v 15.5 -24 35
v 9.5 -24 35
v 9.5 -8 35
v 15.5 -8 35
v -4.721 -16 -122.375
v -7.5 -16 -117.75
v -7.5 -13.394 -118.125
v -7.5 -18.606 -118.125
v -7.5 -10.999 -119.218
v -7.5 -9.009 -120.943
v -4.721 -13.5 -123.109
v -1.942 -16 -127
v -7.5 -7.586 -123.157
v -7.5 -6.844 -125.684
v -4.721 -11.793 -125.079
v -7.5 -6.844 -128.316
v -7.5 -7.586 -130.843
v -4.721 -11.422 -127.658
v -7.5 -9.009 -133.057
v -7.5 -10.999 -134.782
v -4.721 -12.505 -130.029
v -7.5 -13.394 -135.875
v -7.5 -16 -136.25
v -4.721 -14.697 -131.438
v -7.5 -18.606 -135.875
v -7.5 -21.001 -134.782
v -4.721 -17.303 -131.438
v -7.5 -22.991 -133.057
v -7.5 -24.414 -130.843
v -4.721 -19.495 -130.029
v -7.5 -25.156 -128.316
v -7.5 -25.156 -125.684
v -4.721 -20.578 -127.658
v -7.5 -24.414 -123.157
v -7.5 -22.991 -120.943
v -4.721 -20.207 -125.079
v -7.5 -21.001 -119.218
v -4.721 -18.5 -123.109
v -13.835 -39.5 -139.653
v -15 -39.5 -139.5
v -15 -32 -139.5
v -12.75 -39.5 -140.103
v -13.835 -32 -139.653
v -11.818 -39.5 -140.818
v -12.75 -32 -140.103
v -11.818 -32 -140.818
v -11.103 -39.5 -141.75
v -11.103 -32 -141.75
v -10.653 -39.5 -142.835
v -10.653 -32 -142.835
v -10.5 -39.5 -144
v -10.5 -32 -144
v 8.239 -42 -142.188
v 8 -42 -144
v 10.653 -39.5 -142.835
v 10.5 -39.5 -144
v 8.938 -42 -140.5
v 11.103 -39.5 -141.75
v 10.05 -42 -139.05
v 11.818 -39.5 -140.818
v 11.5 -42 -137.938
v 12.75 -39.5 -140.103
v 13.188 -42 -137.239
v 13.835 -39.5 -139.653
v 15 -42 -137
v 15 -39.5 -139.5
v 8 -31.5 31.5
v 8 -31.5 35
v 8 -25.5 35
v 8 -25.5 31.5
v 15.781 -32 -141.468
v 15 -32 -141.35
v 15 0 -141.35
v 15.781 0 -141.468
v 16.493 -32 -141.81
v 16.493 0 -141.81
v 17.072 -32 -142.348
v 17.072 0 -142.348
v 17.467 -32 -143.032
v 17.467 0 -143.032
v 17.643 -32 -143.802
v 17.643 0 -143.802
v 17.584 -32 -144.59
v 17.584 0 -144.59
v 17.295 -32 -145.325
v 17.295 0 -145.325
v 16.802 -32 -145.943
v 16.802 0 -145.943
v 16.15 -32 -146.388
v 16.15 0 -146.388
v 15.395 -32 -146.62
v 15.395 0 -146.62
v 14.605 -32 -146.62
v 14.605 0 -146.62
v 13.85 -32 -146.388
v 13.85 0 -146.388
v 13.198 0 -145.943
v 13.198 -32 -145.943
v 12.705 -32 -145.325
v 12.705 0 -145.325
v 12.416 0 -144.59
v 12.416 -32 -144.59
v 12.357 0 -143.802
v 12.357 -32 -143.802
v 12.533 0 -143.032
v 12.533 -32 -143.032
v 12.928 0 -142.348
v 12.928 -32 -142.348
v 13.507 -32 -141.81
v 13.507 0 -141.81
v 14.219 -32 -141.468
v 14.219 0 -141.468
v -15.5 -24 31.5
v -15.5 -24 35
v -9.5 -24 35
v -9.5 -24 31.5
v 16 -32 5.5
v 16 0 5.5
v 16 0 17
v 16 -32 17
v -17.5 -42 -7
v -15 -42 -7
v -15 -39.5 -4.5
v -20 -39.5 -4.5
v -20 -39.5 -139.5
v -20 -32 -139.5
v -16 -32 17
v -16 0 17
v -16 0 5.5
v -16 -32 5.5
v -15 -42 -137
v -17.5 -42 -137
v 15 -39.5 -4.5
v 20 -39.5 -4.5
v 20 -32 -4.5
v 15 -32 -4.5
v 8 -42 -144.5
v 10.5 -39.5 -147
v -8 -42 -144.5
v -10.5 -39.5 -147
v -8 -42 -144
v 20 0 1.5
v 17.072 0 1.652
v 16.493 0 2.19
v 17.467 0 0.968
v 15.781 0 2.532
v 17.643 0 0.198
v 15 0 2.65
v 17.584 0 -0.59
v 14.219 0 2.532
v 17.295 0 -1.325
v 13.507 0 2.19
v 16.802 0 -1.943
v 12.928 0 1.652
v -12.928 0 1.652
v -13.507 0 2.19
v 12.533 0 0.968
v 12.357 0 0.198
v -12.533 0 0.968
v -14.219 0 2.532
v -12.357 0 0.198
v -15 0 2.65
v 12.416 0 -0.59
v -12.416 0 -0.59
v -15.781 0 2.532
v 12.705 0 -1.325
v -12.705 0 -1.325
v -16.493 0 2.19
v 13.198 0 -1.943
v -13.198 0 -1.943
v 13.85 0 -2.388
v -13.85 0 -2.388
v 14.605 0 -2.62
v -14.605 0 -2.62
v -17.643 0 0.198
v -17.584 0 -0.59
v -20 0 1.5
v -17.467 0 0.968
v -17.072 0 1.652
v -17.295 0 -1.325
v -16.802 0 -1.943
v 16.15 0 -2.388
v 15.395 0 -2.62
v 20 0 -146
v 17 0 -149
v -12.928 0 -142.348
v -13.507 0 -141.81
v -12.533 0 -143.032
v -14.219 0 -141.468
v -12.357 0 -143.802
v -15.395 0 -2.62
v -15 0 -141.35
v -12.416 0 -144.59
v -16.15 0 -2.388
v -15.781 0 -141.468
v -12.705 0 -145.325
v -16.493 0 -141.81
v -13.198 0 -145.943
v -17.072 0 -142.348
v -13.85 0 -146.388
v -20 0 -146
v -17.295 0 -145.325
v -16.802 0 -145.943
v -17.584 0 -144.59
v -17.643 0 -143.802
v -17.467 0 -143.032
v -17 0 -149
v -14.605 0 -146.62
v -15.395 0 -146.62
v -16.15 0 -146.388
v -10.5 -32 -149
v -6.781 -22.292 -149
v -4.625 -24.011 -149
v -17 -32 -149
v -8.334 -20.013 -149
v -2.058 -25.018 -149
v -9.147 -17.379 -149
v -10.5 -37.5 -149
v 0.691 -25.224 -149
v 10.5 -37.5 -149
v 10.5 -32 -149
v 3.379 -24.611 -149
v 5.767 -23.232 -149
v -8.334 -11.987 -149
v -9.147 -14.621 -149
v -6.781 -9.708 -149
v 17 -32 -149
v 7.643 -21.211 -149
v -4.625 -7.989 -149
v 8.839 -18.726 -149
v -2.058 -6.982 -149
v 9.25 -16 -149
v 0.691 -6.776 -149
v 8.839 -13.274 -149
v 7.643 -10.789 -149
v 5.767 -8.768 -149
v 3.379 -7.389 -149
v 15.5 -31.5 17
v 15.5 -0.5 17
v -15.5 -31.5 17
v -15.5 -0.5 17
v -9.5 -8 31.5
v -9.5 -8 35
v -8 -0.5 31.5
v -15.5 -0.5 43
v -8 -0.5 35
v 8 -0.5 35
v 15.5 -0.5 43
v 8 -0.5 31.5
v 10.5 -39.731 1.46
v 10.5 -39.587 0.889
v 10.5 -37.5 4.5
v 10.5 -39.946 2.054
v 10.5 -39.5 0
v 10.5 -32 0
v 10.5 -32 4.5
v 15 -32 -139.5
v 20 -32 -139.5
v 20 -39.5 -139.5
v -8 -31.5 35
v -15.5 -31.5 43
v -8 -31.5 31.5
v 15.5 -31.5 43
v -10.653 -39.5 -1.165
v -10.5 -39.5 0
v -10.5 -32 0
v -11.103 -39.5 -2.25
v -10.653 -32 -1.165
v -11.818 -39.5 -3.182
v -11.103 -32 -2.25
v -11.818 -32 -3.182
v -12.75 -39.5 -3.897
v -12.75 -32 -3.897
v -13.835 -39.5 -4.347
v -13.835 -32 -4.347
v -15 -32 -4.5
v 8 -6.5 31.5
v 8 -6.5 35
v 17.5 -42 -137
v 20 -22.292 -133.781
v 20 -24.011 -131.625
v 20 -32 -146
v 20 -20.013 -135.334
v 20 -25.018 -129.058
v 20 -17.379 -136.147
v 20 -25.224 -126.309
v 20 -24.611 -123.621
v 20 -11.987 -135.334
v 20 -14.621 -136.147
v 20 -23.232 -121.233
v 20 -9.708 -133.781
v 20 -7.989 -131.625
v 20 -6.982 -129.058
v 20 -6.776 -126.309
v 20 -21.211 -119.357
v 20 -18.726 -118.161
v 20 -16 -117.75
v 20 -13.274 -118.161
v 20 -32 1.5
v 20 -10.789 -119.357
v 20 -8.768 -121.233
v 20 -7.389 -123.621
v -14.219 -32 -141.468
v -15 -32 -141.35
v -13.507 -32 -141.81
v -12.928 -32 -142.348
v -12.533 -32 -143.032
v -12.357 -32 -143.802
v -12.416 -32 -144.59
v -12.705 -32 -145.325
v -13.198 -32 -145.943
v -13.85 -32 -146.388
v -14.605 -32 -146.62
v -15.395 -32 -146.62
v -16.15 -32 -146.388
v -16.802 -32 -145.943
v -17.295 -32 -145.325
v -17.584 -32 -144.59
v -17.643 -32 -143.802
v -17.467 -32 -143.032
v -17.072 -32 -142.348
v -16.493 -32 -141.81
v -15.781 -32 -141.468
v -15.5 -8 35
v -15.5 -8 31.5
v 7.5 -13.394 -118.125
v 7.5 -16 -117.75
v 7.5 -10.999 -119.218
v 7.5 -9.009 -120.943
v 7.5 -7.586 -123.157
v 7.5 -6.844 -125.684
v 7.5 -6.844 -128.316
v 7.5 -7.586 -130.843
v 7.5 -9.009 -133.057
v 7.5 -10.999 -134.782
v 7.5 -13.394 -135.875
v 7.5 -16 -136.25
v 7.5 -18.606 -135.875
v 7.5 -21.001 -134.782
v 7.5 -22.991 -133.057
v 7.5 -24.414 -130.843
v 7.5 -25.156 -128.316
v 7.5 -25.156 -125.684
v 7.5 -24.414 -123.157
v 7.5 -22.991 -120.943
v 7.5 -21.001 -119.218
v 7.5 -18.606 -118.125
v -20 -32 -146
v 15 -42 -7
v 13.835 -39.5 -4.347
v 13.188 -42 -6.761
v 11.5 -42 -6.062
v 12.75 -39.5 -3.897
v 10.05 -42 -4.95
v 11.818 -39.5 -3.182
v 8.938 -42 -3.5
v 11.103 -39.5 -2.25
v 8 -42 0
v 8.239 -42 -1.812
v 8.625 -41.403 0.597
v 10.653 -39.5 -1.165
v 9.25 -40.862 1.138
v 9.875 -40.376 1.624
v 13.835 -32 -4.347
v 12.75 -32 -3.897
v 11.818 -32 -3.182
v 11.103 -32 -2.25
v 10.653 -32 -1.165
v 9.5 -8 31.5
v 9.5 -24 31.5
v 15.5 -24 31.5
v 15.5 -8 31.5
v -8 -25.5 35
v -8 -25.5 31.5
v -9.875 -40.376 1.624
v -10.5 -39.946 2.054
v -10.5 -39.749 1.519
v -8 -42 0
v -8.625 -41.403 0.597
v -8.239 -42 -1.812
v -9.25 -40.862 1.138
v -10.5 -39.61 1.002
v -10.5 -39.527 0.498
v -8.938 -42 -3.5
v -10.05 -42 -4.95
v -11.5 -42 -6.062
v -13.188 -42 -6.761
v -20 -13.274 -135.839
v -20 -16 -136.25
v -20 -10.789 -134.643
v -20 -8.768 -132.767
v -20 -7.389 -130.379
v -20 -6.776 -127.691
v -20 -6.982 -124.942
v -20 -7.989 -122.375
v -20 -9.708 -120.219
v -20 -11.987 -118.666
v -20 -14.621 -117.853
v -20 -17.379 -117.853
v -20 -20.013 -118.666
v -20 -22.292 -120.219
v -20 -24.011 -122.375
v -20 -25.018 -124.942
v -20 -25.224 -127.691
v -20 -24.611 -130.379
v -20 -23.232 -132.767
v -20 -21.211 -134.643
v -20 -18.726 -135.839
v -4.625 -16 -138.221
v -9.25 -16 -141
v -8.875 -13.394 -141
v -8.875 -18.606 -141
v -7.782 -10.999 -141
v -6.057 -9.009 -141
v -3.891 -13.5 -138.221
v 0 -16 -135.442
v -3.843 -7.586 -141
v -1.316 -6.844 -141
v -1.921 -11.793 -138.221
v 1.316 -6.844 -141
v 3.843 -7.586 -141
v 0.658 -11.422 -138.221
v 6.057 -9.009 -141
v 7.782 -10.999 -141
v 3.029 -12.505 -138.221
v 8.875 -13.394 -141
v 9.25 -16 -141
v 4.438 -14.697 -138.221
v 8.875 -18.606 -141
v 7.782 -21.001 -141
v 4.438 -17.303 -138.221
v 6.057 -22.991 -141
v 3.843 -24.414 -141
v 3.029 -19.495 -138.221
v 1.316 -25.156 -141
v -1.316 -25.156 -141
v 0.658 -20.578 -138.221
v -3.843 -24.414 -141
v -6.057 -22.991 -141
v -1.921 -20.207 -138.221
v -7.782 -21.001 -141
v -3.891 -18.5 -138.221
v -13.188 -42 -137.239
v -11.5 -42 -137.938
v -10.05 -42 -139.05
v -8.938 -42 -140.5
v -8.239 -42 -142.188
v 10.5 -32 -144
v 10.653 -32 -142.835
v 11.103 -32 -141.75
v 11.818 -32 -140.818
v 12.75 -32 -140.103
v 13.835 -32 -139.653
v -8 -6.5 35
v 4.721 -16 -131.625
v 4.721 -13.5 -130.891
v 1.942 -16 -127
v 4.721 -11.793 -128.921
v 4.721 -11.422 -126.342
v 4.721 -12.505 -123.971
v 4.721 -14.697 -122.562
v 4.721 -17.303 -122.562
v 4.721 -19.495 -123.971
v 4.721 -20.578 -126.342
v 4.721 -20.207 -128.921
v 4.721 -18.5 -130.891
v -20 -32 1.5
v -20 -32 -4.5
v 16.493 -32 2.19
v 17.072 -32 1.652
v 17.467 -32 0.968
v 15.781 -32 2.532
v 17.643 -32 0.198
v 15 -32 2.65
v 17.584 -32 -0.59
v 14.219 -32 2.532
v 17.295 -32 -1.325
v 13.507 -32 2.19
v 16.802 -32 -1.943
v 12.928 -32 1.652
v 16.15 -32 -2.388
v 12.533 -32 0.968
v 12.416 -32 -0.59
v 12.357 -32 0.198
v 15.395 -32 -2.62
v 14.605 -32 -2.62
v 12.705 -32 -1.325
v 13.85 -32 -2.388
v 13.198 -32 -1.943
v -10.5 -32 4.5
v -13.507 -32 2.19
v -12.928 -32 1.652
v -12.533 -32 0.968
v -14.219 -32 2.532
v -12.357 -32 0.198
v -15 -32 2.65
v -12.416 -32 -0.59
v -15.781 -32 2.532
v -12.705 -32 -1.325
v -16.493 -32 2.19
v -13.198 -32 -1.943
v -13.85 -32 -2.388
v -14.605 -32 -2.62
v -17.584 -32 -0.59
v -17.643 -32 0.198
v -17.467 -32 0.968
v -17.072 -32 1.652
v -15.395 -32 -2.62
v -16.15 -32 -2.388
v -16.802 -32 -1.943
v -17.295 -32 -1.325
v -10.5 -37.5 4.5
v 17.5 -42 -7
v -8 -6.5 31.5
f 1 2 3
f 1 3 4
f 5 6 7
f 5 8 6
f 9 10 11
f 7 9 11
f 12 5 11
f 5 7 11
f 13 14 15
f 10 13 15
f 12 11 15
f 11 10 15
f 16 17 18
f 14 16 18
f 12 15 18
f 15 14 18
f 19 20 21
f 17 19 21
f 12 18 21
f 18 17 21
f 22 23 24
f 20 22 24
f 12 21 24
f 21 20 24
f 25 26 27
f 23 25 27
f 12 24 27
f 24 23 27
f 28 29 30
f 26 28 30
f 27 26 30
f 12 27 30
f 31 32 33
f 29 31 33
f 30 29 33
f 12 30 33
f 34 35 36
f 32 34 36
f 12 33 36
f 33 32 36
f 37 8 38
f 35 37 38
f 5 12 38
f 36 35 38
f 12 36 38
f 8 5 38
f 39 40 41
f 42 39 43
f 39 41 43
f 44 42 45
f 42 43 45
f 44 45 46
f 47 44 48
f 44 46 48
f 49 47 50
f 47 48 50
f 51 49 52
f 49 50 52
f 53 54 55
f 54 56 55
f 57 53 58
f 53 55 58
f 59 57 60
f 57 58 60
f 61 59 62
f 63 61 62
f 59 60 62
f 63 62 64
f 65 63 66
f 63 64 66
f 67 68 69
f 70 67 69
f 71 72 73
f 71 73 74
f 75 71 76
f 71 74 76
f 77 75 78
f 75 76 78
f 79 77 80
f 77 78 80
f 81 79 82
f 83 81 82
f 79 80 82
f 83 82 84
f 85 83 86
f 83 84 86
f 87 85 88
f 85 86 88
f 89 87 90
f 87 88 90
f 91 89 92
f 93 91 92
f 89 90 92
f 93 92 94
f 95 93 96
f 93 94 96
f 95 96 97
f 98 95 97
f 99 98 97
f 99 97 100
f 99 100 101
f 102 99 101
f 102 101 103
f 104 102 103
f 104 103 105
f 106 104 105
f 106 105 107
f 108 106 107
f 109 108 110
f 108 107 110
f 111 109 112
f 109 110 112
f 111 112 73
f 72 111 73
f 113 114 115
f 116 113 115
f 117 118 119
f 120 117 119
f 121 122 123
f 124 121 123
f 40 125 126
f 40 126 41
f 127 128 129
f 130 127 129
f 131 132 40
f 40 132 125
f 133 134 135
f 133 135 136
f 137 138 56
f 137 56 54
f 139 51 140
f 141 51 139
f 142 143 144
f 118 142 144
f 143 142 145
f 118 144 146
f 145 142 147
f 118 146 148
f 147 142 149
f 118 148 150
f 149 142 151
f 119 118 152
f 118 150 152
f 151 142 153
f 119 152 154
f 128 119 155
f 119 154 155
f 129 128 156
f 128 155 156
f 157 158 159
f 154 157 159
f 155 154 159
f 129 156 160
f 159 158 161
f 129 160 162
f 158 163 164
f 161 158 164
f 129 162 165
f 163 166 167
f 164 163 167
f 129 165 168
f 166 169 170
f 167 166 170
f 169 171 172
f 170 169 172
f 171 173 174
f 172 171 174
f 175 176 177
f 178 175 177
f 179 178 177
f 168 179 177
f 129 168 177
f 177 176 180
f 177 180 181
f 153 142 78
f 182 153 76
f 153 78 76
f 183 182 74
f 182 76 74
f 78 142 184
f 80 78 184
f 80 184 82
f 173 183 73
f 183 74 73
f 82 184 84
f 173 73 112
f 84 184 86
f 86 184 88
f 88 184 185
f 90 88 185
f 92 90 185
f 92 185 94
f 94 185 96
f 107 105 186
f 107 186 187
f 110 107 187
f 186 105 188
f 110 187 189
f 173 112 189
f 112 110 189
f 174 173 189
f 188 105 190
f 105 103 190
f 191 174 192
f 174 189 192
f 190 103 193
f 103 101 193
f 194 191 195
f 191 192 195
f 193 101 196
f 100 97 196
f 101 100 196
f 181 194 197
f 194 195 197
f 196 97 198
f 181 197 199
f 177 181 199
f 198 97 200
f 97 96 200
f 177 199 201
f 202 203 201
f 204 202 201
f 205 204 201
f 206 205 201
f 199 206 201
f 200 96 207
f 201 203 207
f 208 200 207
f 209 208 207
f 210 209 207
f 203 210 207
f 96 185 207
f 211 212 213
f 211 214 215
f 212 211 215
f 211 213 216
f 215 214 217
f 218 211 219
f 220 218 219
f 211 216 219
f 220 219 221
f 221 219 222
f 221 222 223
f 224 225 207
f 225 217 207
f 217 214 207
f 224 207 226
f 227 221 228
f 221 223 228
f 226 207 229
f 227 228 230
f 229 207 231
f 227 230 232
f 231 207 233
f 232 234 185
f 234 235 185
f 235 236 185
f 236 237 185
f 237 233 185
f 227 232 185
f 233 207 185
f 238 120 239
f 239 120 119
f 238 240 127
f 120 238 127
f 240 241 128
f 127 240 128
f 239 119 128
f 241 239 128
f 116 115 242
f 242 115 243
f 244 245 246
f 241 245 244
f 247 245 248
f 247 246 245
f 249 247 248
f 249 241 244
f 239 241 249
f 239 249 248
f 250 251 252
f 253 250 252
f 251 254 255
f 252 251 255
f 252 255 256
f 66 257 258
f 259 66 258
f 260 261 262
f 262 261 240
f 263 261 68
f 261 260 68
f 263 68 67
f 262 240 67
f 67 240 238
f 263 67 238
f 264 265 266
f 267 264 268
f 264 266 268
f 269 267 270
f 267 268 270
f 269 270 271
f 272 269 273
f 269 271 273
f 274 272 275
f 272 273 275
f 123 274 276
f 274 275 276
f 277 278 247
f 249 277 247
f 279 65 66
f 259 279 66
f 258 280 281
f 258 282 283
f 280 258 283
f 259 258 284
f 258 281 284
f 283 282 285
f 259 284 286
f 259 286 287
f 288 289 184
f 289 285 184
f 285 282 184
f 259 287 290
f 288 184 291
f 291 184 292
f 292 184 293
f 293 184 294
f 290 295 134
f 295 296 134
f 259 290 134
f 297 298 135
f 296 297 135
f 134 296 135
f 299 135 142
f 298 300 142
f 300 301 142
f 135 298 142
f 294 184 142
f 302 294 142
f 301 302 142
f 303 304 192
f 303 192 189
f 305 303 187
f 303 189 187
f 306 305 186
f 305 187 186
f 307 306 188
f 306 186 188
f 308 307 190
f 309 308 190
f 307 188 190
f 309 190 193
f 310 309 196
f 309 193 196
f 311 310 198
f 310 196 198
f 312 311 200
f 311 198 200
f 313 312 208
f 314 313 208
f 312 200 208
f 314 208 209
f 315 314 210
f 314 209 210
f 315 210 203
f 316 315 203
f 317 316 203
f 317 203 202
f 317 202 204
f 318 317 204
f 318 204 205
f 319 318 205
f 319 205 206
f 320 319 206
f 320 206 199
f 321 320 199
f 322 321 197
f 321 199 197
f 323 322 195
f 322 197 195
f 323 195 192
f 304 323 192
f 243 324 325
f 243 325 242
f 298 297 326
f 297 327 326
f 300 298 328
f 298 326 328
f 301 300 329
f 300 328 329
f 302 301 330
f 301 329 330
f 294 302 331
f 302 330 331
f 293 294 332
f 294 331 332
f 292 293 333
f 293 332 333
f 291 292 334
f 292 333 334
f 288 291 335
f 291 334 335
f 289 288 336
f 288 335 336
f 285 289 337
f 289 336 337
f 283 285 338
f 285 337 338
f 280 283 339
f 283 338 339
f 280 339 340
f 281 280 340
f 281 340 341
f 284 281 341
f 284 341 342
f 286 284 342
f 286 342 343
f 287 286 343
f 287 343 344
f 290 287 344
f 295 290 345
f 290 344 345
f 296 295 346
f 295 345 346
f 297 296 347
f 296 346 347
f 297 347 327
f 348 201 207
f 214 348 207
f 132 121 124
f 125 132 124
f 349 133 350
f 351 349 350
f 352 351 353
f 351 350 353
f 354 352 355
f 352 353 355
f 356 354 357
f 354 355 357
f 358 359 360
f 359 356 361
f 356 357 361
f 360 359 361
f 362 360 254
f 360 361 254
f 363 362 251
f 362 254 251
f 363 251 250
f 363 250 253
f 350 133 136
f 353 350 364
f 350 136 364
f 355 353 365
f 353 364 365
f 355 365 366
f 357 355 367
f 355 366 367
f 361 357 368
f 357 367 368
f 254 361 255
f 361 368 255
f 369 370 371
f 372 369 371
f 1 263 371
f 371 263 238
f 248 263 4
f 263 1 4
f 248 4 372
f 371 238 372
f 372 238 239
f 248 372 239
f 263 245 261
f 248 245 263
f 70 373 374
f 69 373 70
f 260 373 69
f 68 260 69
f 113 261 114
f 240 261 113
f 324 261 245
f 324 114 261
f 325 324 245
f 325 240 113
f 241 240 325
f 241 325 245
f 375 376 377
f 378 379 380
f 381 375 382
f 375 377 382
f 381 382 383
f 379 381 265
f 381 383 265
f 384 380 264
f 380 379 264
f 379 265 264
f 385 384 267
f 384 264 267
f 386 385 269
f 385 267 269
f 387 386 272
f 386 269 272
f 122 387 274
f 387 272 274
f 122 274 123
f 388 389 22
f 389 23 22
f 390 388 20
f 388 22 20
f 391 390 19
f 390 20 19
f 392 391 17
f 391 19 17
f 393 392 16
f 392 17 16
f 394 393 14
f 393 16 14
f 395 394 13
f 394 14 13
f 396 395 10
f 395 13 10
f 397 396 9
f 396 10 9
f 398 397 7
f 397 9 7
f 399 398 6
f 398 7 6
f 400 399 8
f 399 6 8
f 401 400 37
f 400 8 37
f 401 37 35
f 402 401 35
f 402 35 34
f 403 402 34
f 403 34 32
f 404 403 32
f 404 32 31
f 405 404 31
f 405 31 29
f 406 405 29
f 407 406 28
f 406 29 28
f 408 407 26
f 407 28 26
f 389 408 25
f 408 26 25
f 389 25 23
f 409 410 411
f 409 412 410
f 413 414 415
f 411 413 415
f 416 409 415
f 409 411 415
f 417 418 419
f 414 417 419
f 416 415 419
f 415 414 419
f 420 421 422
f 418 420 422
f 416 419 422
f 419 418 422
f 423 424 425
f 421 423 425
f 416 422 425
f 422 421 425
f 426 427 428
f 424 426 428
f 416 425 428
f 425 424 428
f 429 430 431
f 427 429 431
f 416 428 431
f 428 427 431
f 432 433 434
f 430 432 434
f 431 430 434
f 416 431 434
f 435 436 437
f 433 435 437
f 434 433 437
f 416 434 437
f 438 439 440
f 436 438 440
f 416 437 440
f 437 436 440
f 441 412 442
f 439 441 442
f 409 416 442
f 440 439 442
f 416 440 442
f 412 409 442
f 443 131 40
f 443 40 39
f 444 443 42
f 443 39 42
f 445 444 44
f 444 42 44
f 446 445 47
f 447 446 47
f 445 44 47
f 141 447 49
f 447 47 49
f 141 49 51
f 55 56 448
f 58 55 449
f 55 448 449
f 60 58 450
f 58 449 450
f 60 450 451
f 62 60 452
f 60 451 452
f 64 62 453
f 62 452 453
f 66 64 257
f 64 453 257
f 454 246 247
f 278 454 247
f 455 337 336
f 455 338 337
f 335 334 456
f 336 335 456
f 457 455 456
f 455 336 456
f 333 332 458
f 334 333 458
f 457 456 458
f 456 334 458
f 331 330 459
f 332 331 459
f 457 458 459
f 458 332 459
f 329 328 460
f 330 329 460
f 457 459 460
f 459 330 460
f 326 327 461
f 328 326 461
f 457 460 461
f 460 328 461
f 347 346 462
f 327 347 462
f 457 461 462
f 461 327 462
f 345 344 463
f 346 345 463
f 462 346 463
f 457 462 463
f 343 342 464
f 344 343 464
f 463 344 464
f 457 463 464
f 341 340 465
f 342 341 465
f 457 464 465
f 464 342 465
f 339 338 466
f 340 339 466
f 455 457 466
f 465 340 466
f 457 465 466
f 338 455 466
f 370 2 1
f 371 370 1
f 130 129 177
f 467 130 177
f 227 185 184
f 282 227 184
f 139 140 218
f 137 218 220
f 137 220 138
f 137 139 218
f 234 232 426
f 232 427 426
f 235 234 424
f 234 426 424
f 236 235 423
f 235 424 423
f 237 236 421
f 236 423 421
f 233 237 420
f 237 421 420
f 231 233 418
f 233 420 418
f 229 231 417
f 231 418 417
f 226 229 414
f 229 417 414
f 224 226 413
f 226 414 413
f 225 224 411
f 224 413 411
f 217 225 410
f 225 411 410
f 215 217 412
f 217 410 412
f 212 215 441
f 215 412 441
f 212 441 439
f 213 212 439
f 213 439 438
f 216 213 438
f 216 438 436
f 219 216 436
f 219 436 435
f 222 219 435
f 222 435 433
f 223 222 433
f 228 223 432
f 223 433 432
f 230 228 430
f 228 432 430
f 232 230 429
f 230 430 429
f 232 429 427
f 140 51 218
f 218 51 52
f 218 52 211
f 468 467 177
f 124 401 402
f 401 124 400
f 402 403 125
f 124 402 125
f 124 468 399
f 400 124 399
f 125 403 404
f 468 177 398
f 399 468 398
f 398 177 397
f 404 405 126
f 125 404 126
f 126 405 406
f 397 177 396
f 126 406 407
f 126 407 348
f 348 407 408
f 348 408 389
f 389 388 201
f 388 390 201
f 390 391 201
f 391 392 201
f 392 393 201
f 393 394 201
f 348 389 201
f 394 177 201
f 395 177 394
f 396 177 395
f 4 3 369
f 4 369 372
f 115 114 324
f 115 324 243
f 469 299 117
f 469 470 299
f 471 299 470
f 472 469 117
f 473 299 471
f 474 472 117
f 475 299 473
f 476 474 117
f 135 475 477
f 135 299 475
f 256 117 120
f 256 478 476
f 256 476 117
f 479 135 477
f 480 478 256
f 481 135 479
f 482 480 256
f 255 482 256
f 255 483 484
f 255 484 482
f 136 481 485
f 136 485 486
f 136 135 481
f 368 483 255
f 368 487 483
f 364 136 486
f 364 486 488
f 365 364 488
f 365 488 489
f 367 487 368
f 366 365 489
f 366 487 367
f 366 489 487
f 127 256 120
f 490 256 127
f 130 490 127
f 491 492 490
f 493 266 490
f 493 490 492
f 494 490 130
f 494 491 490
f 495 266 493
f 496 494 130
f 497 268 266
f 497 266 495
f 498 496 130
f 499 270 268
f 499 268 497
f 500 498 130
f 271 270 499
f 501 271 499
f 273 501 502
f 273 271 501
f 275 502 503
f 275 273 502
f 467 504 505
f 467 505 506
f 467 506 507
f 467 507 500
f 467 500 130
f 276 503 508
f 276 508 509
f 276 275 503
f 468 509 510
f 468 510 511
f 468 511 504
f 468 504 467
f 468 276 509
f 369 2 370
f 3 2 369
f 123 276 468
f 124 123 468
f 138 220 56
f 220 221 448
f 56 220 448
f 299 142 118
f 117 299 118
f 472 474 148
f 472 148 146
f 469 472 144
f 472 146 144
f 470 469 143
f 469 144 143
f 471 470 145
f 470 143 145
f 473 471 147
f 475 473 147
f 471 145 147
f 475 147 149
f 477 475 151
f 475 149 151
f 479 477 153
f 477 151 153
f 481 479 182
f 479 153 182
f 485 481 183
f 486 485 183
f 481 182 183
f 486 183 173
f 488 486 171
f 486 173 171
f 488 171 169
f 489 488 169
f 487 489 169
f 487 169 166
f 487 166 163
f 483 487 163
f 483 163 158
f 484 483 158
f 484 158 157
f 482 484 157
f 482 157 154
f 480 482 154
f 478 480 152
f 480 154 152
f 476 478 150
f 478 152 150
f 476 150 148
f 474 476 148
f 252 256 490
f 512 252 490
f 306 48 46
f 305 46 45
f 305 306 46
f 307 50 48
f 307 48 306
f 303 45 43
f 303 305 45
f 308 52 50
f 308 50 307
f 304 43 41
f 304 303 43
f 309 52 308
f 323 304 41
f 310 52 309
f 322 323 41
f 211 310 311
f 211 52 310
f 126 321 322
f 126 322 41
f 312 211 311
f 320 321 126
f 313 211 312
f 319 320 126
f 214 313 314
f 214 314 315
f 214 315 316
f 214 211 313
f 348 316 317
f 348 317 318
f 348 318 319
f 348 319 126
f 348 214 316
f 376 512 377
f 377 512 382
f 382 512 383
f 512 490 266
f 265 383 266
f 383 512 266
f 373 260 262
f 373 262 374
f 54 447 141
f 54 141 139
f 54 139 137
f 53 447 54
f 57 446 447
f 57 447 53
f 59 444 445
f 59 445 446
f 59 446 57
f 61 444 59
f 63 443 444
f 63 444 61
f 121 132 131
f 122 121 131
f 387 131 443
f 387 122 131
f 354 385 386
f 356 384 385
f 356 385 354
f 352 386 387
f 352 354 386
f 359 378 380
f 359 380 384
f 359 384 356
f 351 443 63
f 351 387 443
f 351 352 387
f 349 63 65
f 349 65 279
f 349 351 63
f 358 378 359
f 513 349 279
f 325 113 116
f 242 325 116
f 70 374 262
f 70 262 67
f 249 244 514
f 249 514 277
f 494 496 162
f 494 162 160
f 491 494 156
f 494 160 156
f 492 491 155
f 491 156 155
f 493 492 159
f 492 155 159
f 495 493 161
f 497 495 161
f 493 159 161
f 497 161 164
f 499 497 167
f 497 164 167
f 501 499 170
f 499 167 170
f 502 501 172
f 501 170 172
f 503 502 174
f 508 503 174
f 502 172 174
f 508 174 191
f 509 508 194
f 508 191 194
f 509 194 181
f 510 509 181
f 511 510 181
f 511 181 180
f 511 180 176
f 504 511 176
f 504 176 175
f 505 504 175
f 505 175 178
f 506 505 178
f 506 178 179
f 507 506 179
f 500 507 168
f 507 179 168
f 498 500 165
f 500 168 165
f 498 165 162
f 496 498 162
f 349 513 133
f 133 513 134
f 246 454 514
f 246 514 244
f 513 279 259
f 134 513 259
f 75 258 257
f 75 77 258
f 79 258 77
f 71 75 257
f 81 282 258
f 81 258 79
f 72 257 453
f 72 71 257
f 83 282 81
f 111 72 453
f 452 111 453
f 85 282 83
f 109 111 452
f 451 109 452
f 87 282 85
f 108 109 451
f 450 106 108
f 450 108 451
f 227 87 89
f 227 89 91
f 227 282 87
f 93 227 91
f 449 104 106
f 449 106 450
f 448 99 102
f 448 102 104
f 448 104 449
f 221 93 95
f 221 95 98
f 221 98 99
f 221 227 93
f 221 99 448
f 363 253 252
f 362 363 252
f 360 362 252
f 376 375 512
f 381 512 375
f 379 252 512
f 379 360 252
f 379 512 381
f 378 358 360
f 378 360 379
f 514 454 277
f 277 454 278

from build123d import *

# Parameters (mm, degrees)
SKIZZE1_R                       = 2.65
AUFSATZ_LINEAR_AUSTRAGEN1_DEPTH = 32
SKIZZE2_W                       = 31
SKIZZE2_H                       = 31
AUFSATZ_LINEAR_AUSTRAGEN2_DEPTH = 26
AUFSATZ_LINEAR_AUSTRAGEN3_DEPTH = 10
FASE2_SIZE                      = 4.5
FASE1_SIZE                      = 2.5
M20X1_5_GEWINDEBOHRUNG1_D       = 18.5
M20X1_5_GEWINDEBOHRUNG1_DEPTH   = 8
M20X1_5_GEWINDEBOHRUNG1_TIP     = 5.557960726
M20X1_5_GEWINDEBOHRUNG2_D       = 18.5
M20X1_5_GEWINDEBOHRUNG2_DEPTH   = 12.5
M20X1_5_GEWINDEBOHRUNG2_TIP     = 5.557960726
M20X1_5_GEWINDEBOHRUNG3_D       = 18.5
M20X1_5_GEWINDEBOHRUNG3_DEPTH   = 12.5
M20X1_5_GEWINDEBOHRUNG3_TIP     = 5.557960726
SKIZZE10_W                      = 6
SKIZZE10_H                      = 16
SKIZZE10_W_2                    = 16
SKIZZE10_H_2                    = 6
SCHNITT_LINEAR_AUSTRAGEN1_DEPTH = 3.5


with BuildPart() as part:
    # Skizze1 → Aufsatz-Linear austragen1 (new body)
    with BuildSketch(Plane(origin=(0, 0, 0), x_dir=(1, 0, 0), z_dir=(0, 1, 0))):
        Polygon((16, -17), (-16, -17), (-16, -5.5), (-20, -1.5), (-20, 146), (-17, 149), (17, 149), (20, 146), (20, -1.5), (16, -5.5), align=None)
        with Locations(Location((15, 0, 0), (0, 0, 270))):
            Circle(SKIZZE1_R, mode=Mode.SUBTRACT)
        with Locations(Location((-15, 0, 0), (0, 0, 270))):
            Circle(SKIZZE1_R, mode=Mode.SUBTRACT)
        with Locations(Location((-15, 144, 0), (0, 0, 270))):
            Circle(SKIZZE1_R, mode=Mode.SUBTRACT)
        with Locations(Location((15, 144, 0), (0, 0, 270))):
            Circle(SKIZZE1_R, mode=Mode.SUBTRACT)
    extrude(amount=-AUFSATZ_LINEAR_AUSTRAGEN1_DEPTH)

    # Skizze2 → Aufsatz-Linear austragen2 (add)
    with BuildSketch(Plane.XY.offset(17)):
        with Locations((0, -16)):
            Rectangle(SKIZZE2_W, SKIZZE2_H)
    extrude(amount=AUFSATZ_LINEAR_AUSTRAGEN2_DEPTH)

    # Skizze3 → Aufsatz-Linear austragen3 (add)
    with BuildSketch(Plane.XZ.offset(32)):
        with BuildLine():
            Line((20, -4.5), (15, -4.5))
            ThreePointArc((15, -4.5), (11.818019485, -3.181980515), (10.5, 0))
            Line((10.5, 0), (10.5, 4.5))
            Line((10.5, 4.5), (-10.5, 4.5))
            Line((-10.5, 4.5), (-10.5, 0))
            ThreePointArc((-10.5, 0), (-11.818019485, -3.181980515), (-15, -4.5))
            Line((-15, -4.5), (-20, -4.5))
            Line((-20, -4.5), (-20, -139.5))
            Line((-20, -139.5), (-15, -139.5))
            ThreePointArc((-15, -139.5), (-11.818019485, -140.818019485), (-10.5, -144))
            Line((-10.5, -144), (-10.5, -149))
            Line((-10.5, -149), (10.5, -149))
            Line((10.5, -149), (10.5, -144))
            ThreePointArc((10.5, -144), (11.818019485, -140.818019485), (15, -139.5))
            Line((15, -139.5), (20, -139.5))
            Line((20, -139.5), (20, -4.5))
        make_face()
    extrude(amount=AUFSATZ_LINEAR_AUSTRAGEN3_DEPTH)

    # Fase2
    fase2_edges = [part.edges().sort_by_distance(p)[0] for p in [
        (0, -42, 4.5),
        (0, -42, -149),
    ]]
    chamfer(fase2_edges, length=FASE2_SIZE)

    # Fase1
    # the kernel refuses this chamfer: 2.5 mm, written as the material it takes off along each edge
    with BuildSketch(Plane(origin=(10.5, -42, -150.92920747), x_dir=(0.027495876610586282, 0.9996219169112968, 0), z_dir=(0, 0, 1)), Plane(origin=(-10.5, -42, -144), x_dir=(-0.027495876610586282, 0.9996219169112968, 0), z_dir=(0, 0, -1))) as fase1_piece_1:
        Polygon((FASE1_SIZE * 0.999621916911, FASE1_SIZE * 0.0274958766106), (-FASE1_SIZE * 0.0274958766106, FASE1_SIZE * 0.999621916911), (0, 0), align=None)
    extrude(amount=6.92920747, mode=Mode.SUBTRACT)
    with BuildSketch(Plane(origin=(20, -42, -145.92920747), x_dir=(-0.9996219169112968, -0.0274958766105877, 0), z_dir=(0, 0, 1)), Plane(origin=(-20, -42, 1.92920747), x_dir=(0.9996219169112968, -0.0274958766105877, 0), z_dir=(0, 0, -1))) as fase1_piece_2:
        Polygon((FASE1_SIZE * 0.999621916911, -FASE1_SIZE * 0.0274958766106), (-FASE1_SIZE * 0.0274958766106, -FASE1_SIZE * 0.999621916911), (0, 0), align=None)
    extrude(amount=147.85841494, mode=Mode.SUBTRACT)
    with BuildSketch(Plane(origin=(26.42920747, -42, -4.5), x_dir=(0, -0.0274958766105877, -0.9996219169112968), z_dir=(-1, 0, 0)), Plane(origin=(-15, -42, -4.5), x_dir=(0, -0.0274958766105877, -0.9996219169112968), z_dir=(-1, 0, 0)), Plane(origin=(-26.42920747, -42, -139.5), x_dir=(0, -0.027495876610587815, 0.9996219169112968), z_dir=(1, 0, 0)), Plane(origin=(15, -42, -139.5), x_dir=(0, -0.027495876610587815, 0.9996219169112968), z_dir=(1, 0, 0))) as fase1_piece_3:
        Polygon((FASE1_SIZE * 0.999621916911, -FASE1_SIZE * 0.0274958766106), (-FASE1_SIZE * 0.0274958766106, -FASE1_SIZE * 0.999621916911), (0, 0), align=None)
    extrude(amount=11.42920747, mode=Mode.SUBTRACT)
    with BuildSketch(Plane(origin=(15, -42, 0), x_dir=(0, 0, -1), z_dir=(1, 0, 0))) as fase1_piece_4:
        Polygon((4.5 + FASE1_SIZE, 0), (4.5, FASE1_SIZE), (4.5, 0), align=None)
    revolve(axis=Axis((15, -42, 0), (0, 1, 0)), revolution_arc=171.892095433, mode=Mode.SUBTRACT)
    with BuildSketch(Plane(origin=(-15, -42, 0), x_dir=(0.14103781497281773, 0, 0.9900042094595827), z_dir=(-0.9900042094595827, 0, 0.14103781497281773))) as fase1_piece_5:
        Polygon((4.5 + FASE1_SIZE, 0), (4.5, FASE1_SIZE), (4.5, 0), align=None)
    revolve(axis=Axis((-15, -42, 0), (0, 1, 0)), revolution_arc=171.892095433, mode=Mode.SUBTRACT)
    with BuildSketch(Plane(origin=(-15, -42, -144), x_dir=(0, 0, 1), z_dir=(-1, 0, 0))) as fase1_piece_6:
        Polygon((4.5 + FASE1_SIZE, 0), (4.5, FASE1_SIZE), (4.5, 0), align=None)
    revolve(axis=Axis((-15, -42, -144), (0, 1, 0)), revolution_arc=90, mode=Mode.SUBTRACT)
    with BuildSketch(Plane(origin=(15, -42, -144), x_dir=(-1, 0, 0), z_dir=(0, 0, -1))) as fase1_piece_7:
        Polygon((4.5 + FASE1_SIZE, 0), (4.5, FASE1_SIZE), (4.5, 0), align=None)
    revolve(axis=Axis((15, -42, -144), (0, 1, 0)), revolution_arc=90, mode=Mode.SUBTRACT)

    # M20x1.5 Gewindebohrung1
    with Locations(Plane(origin=(0, 0, -149), x_dir=(-1, 0, 0), z_dir=(0, 0, -1))):
        with Locations((0, -16)):
            Hole(M20X1_5_GEWINDEBOHRUNG1_D / 2, depth=M20X1_5_GEWINDEBOHRUNG1_DEPTH)
            with Locations((0, 0, -(M20X1_5_GEWINDEBOHRUNG1_DEPTH + M20X1_5_GEWINDEBOHRUNG1_TIP / 2))):  # 118° drill point
                Cone(0, M20X1_5_GEWINDEBOHRUNG1_D / 2, M20X1_5_GEWINDEBOHRUNG1_TIP, mode=Mode.SUBTRACT)

    # M20x1.5 Gewindebohrung2
    with Locations(Plane.ZY.offset(20)):
        with Locations((-127, -16)):
            Hole(M20X1_5_GEWINDEBOHRUNG2_D / 2, depth=M20X1_5_GEWINDEBOHRUNG2_DEPTH)
            with Locations((0, 0, -(M20X1_5_GEWINDEBOHRUNG2_DEPTH + M20X1_5_GEWINDEBOHRUNG2_TIP / 2))):  # 118° drill point
                Cone(0, M20X1_5_GEWINDEBOHRUNG2_D / 2, M20X1_5_GEWINDEBOHRUNG2_TIP, mode=Mode.SUBTRACT)

    # M20x1.5 Gewindebohrung3
    with Locations(Plane(origin=(20, 0, 0), x_dir=(0, 0, -1), z_dir=(1, 0, 0))):
        with Locations((127, -16)):
            Hole(M20X1_5_GEWINDEBOHRUNG3_D / 2, depth=M20X1_5_GEWINDEBOHRUNG3_DEPTH)
            with Locations((0, 0, -(M20X1_5_GEWINDEBOHRUNG3_DEPTH + M20X1_5_GEWINDEBOHRUNG3_TIP / 2))):  # 118° drill point
                Cone(0, M20X1_5_GEWINDEBOHRUNG3_D / 2, M20X1_5_GEWINDEBOHRUNG3_TIP, mode=Mode.SUBTRACT)

    # Skizze10 → Schnitt-Linear austragen1 (cut)
    with BuildSketch(Plane.XY.offset(35)):
        with Locations((12.5, -16)):
            Rectangle(SKIZZE10_W, SKIZZE10_H)
        with Locations((0, -28.5)):
            Rectangle(SKIZZE10_W_2, SKIZZE10_H_2)
        with Locations((-12.5, -16)):
            Rectangle(SKIZZE10_W, SKIZZE10_H)
        with Locations((0, -3.5)):
            Rectangle(SKIZZE10_W_2, SKIZZE10_H_2)
    extrude(amount=-SCHNITT_LINEAR_AUSTRAGEN1_DEPTH, mode=Mode.SUBTRACT)


solid = part.part
